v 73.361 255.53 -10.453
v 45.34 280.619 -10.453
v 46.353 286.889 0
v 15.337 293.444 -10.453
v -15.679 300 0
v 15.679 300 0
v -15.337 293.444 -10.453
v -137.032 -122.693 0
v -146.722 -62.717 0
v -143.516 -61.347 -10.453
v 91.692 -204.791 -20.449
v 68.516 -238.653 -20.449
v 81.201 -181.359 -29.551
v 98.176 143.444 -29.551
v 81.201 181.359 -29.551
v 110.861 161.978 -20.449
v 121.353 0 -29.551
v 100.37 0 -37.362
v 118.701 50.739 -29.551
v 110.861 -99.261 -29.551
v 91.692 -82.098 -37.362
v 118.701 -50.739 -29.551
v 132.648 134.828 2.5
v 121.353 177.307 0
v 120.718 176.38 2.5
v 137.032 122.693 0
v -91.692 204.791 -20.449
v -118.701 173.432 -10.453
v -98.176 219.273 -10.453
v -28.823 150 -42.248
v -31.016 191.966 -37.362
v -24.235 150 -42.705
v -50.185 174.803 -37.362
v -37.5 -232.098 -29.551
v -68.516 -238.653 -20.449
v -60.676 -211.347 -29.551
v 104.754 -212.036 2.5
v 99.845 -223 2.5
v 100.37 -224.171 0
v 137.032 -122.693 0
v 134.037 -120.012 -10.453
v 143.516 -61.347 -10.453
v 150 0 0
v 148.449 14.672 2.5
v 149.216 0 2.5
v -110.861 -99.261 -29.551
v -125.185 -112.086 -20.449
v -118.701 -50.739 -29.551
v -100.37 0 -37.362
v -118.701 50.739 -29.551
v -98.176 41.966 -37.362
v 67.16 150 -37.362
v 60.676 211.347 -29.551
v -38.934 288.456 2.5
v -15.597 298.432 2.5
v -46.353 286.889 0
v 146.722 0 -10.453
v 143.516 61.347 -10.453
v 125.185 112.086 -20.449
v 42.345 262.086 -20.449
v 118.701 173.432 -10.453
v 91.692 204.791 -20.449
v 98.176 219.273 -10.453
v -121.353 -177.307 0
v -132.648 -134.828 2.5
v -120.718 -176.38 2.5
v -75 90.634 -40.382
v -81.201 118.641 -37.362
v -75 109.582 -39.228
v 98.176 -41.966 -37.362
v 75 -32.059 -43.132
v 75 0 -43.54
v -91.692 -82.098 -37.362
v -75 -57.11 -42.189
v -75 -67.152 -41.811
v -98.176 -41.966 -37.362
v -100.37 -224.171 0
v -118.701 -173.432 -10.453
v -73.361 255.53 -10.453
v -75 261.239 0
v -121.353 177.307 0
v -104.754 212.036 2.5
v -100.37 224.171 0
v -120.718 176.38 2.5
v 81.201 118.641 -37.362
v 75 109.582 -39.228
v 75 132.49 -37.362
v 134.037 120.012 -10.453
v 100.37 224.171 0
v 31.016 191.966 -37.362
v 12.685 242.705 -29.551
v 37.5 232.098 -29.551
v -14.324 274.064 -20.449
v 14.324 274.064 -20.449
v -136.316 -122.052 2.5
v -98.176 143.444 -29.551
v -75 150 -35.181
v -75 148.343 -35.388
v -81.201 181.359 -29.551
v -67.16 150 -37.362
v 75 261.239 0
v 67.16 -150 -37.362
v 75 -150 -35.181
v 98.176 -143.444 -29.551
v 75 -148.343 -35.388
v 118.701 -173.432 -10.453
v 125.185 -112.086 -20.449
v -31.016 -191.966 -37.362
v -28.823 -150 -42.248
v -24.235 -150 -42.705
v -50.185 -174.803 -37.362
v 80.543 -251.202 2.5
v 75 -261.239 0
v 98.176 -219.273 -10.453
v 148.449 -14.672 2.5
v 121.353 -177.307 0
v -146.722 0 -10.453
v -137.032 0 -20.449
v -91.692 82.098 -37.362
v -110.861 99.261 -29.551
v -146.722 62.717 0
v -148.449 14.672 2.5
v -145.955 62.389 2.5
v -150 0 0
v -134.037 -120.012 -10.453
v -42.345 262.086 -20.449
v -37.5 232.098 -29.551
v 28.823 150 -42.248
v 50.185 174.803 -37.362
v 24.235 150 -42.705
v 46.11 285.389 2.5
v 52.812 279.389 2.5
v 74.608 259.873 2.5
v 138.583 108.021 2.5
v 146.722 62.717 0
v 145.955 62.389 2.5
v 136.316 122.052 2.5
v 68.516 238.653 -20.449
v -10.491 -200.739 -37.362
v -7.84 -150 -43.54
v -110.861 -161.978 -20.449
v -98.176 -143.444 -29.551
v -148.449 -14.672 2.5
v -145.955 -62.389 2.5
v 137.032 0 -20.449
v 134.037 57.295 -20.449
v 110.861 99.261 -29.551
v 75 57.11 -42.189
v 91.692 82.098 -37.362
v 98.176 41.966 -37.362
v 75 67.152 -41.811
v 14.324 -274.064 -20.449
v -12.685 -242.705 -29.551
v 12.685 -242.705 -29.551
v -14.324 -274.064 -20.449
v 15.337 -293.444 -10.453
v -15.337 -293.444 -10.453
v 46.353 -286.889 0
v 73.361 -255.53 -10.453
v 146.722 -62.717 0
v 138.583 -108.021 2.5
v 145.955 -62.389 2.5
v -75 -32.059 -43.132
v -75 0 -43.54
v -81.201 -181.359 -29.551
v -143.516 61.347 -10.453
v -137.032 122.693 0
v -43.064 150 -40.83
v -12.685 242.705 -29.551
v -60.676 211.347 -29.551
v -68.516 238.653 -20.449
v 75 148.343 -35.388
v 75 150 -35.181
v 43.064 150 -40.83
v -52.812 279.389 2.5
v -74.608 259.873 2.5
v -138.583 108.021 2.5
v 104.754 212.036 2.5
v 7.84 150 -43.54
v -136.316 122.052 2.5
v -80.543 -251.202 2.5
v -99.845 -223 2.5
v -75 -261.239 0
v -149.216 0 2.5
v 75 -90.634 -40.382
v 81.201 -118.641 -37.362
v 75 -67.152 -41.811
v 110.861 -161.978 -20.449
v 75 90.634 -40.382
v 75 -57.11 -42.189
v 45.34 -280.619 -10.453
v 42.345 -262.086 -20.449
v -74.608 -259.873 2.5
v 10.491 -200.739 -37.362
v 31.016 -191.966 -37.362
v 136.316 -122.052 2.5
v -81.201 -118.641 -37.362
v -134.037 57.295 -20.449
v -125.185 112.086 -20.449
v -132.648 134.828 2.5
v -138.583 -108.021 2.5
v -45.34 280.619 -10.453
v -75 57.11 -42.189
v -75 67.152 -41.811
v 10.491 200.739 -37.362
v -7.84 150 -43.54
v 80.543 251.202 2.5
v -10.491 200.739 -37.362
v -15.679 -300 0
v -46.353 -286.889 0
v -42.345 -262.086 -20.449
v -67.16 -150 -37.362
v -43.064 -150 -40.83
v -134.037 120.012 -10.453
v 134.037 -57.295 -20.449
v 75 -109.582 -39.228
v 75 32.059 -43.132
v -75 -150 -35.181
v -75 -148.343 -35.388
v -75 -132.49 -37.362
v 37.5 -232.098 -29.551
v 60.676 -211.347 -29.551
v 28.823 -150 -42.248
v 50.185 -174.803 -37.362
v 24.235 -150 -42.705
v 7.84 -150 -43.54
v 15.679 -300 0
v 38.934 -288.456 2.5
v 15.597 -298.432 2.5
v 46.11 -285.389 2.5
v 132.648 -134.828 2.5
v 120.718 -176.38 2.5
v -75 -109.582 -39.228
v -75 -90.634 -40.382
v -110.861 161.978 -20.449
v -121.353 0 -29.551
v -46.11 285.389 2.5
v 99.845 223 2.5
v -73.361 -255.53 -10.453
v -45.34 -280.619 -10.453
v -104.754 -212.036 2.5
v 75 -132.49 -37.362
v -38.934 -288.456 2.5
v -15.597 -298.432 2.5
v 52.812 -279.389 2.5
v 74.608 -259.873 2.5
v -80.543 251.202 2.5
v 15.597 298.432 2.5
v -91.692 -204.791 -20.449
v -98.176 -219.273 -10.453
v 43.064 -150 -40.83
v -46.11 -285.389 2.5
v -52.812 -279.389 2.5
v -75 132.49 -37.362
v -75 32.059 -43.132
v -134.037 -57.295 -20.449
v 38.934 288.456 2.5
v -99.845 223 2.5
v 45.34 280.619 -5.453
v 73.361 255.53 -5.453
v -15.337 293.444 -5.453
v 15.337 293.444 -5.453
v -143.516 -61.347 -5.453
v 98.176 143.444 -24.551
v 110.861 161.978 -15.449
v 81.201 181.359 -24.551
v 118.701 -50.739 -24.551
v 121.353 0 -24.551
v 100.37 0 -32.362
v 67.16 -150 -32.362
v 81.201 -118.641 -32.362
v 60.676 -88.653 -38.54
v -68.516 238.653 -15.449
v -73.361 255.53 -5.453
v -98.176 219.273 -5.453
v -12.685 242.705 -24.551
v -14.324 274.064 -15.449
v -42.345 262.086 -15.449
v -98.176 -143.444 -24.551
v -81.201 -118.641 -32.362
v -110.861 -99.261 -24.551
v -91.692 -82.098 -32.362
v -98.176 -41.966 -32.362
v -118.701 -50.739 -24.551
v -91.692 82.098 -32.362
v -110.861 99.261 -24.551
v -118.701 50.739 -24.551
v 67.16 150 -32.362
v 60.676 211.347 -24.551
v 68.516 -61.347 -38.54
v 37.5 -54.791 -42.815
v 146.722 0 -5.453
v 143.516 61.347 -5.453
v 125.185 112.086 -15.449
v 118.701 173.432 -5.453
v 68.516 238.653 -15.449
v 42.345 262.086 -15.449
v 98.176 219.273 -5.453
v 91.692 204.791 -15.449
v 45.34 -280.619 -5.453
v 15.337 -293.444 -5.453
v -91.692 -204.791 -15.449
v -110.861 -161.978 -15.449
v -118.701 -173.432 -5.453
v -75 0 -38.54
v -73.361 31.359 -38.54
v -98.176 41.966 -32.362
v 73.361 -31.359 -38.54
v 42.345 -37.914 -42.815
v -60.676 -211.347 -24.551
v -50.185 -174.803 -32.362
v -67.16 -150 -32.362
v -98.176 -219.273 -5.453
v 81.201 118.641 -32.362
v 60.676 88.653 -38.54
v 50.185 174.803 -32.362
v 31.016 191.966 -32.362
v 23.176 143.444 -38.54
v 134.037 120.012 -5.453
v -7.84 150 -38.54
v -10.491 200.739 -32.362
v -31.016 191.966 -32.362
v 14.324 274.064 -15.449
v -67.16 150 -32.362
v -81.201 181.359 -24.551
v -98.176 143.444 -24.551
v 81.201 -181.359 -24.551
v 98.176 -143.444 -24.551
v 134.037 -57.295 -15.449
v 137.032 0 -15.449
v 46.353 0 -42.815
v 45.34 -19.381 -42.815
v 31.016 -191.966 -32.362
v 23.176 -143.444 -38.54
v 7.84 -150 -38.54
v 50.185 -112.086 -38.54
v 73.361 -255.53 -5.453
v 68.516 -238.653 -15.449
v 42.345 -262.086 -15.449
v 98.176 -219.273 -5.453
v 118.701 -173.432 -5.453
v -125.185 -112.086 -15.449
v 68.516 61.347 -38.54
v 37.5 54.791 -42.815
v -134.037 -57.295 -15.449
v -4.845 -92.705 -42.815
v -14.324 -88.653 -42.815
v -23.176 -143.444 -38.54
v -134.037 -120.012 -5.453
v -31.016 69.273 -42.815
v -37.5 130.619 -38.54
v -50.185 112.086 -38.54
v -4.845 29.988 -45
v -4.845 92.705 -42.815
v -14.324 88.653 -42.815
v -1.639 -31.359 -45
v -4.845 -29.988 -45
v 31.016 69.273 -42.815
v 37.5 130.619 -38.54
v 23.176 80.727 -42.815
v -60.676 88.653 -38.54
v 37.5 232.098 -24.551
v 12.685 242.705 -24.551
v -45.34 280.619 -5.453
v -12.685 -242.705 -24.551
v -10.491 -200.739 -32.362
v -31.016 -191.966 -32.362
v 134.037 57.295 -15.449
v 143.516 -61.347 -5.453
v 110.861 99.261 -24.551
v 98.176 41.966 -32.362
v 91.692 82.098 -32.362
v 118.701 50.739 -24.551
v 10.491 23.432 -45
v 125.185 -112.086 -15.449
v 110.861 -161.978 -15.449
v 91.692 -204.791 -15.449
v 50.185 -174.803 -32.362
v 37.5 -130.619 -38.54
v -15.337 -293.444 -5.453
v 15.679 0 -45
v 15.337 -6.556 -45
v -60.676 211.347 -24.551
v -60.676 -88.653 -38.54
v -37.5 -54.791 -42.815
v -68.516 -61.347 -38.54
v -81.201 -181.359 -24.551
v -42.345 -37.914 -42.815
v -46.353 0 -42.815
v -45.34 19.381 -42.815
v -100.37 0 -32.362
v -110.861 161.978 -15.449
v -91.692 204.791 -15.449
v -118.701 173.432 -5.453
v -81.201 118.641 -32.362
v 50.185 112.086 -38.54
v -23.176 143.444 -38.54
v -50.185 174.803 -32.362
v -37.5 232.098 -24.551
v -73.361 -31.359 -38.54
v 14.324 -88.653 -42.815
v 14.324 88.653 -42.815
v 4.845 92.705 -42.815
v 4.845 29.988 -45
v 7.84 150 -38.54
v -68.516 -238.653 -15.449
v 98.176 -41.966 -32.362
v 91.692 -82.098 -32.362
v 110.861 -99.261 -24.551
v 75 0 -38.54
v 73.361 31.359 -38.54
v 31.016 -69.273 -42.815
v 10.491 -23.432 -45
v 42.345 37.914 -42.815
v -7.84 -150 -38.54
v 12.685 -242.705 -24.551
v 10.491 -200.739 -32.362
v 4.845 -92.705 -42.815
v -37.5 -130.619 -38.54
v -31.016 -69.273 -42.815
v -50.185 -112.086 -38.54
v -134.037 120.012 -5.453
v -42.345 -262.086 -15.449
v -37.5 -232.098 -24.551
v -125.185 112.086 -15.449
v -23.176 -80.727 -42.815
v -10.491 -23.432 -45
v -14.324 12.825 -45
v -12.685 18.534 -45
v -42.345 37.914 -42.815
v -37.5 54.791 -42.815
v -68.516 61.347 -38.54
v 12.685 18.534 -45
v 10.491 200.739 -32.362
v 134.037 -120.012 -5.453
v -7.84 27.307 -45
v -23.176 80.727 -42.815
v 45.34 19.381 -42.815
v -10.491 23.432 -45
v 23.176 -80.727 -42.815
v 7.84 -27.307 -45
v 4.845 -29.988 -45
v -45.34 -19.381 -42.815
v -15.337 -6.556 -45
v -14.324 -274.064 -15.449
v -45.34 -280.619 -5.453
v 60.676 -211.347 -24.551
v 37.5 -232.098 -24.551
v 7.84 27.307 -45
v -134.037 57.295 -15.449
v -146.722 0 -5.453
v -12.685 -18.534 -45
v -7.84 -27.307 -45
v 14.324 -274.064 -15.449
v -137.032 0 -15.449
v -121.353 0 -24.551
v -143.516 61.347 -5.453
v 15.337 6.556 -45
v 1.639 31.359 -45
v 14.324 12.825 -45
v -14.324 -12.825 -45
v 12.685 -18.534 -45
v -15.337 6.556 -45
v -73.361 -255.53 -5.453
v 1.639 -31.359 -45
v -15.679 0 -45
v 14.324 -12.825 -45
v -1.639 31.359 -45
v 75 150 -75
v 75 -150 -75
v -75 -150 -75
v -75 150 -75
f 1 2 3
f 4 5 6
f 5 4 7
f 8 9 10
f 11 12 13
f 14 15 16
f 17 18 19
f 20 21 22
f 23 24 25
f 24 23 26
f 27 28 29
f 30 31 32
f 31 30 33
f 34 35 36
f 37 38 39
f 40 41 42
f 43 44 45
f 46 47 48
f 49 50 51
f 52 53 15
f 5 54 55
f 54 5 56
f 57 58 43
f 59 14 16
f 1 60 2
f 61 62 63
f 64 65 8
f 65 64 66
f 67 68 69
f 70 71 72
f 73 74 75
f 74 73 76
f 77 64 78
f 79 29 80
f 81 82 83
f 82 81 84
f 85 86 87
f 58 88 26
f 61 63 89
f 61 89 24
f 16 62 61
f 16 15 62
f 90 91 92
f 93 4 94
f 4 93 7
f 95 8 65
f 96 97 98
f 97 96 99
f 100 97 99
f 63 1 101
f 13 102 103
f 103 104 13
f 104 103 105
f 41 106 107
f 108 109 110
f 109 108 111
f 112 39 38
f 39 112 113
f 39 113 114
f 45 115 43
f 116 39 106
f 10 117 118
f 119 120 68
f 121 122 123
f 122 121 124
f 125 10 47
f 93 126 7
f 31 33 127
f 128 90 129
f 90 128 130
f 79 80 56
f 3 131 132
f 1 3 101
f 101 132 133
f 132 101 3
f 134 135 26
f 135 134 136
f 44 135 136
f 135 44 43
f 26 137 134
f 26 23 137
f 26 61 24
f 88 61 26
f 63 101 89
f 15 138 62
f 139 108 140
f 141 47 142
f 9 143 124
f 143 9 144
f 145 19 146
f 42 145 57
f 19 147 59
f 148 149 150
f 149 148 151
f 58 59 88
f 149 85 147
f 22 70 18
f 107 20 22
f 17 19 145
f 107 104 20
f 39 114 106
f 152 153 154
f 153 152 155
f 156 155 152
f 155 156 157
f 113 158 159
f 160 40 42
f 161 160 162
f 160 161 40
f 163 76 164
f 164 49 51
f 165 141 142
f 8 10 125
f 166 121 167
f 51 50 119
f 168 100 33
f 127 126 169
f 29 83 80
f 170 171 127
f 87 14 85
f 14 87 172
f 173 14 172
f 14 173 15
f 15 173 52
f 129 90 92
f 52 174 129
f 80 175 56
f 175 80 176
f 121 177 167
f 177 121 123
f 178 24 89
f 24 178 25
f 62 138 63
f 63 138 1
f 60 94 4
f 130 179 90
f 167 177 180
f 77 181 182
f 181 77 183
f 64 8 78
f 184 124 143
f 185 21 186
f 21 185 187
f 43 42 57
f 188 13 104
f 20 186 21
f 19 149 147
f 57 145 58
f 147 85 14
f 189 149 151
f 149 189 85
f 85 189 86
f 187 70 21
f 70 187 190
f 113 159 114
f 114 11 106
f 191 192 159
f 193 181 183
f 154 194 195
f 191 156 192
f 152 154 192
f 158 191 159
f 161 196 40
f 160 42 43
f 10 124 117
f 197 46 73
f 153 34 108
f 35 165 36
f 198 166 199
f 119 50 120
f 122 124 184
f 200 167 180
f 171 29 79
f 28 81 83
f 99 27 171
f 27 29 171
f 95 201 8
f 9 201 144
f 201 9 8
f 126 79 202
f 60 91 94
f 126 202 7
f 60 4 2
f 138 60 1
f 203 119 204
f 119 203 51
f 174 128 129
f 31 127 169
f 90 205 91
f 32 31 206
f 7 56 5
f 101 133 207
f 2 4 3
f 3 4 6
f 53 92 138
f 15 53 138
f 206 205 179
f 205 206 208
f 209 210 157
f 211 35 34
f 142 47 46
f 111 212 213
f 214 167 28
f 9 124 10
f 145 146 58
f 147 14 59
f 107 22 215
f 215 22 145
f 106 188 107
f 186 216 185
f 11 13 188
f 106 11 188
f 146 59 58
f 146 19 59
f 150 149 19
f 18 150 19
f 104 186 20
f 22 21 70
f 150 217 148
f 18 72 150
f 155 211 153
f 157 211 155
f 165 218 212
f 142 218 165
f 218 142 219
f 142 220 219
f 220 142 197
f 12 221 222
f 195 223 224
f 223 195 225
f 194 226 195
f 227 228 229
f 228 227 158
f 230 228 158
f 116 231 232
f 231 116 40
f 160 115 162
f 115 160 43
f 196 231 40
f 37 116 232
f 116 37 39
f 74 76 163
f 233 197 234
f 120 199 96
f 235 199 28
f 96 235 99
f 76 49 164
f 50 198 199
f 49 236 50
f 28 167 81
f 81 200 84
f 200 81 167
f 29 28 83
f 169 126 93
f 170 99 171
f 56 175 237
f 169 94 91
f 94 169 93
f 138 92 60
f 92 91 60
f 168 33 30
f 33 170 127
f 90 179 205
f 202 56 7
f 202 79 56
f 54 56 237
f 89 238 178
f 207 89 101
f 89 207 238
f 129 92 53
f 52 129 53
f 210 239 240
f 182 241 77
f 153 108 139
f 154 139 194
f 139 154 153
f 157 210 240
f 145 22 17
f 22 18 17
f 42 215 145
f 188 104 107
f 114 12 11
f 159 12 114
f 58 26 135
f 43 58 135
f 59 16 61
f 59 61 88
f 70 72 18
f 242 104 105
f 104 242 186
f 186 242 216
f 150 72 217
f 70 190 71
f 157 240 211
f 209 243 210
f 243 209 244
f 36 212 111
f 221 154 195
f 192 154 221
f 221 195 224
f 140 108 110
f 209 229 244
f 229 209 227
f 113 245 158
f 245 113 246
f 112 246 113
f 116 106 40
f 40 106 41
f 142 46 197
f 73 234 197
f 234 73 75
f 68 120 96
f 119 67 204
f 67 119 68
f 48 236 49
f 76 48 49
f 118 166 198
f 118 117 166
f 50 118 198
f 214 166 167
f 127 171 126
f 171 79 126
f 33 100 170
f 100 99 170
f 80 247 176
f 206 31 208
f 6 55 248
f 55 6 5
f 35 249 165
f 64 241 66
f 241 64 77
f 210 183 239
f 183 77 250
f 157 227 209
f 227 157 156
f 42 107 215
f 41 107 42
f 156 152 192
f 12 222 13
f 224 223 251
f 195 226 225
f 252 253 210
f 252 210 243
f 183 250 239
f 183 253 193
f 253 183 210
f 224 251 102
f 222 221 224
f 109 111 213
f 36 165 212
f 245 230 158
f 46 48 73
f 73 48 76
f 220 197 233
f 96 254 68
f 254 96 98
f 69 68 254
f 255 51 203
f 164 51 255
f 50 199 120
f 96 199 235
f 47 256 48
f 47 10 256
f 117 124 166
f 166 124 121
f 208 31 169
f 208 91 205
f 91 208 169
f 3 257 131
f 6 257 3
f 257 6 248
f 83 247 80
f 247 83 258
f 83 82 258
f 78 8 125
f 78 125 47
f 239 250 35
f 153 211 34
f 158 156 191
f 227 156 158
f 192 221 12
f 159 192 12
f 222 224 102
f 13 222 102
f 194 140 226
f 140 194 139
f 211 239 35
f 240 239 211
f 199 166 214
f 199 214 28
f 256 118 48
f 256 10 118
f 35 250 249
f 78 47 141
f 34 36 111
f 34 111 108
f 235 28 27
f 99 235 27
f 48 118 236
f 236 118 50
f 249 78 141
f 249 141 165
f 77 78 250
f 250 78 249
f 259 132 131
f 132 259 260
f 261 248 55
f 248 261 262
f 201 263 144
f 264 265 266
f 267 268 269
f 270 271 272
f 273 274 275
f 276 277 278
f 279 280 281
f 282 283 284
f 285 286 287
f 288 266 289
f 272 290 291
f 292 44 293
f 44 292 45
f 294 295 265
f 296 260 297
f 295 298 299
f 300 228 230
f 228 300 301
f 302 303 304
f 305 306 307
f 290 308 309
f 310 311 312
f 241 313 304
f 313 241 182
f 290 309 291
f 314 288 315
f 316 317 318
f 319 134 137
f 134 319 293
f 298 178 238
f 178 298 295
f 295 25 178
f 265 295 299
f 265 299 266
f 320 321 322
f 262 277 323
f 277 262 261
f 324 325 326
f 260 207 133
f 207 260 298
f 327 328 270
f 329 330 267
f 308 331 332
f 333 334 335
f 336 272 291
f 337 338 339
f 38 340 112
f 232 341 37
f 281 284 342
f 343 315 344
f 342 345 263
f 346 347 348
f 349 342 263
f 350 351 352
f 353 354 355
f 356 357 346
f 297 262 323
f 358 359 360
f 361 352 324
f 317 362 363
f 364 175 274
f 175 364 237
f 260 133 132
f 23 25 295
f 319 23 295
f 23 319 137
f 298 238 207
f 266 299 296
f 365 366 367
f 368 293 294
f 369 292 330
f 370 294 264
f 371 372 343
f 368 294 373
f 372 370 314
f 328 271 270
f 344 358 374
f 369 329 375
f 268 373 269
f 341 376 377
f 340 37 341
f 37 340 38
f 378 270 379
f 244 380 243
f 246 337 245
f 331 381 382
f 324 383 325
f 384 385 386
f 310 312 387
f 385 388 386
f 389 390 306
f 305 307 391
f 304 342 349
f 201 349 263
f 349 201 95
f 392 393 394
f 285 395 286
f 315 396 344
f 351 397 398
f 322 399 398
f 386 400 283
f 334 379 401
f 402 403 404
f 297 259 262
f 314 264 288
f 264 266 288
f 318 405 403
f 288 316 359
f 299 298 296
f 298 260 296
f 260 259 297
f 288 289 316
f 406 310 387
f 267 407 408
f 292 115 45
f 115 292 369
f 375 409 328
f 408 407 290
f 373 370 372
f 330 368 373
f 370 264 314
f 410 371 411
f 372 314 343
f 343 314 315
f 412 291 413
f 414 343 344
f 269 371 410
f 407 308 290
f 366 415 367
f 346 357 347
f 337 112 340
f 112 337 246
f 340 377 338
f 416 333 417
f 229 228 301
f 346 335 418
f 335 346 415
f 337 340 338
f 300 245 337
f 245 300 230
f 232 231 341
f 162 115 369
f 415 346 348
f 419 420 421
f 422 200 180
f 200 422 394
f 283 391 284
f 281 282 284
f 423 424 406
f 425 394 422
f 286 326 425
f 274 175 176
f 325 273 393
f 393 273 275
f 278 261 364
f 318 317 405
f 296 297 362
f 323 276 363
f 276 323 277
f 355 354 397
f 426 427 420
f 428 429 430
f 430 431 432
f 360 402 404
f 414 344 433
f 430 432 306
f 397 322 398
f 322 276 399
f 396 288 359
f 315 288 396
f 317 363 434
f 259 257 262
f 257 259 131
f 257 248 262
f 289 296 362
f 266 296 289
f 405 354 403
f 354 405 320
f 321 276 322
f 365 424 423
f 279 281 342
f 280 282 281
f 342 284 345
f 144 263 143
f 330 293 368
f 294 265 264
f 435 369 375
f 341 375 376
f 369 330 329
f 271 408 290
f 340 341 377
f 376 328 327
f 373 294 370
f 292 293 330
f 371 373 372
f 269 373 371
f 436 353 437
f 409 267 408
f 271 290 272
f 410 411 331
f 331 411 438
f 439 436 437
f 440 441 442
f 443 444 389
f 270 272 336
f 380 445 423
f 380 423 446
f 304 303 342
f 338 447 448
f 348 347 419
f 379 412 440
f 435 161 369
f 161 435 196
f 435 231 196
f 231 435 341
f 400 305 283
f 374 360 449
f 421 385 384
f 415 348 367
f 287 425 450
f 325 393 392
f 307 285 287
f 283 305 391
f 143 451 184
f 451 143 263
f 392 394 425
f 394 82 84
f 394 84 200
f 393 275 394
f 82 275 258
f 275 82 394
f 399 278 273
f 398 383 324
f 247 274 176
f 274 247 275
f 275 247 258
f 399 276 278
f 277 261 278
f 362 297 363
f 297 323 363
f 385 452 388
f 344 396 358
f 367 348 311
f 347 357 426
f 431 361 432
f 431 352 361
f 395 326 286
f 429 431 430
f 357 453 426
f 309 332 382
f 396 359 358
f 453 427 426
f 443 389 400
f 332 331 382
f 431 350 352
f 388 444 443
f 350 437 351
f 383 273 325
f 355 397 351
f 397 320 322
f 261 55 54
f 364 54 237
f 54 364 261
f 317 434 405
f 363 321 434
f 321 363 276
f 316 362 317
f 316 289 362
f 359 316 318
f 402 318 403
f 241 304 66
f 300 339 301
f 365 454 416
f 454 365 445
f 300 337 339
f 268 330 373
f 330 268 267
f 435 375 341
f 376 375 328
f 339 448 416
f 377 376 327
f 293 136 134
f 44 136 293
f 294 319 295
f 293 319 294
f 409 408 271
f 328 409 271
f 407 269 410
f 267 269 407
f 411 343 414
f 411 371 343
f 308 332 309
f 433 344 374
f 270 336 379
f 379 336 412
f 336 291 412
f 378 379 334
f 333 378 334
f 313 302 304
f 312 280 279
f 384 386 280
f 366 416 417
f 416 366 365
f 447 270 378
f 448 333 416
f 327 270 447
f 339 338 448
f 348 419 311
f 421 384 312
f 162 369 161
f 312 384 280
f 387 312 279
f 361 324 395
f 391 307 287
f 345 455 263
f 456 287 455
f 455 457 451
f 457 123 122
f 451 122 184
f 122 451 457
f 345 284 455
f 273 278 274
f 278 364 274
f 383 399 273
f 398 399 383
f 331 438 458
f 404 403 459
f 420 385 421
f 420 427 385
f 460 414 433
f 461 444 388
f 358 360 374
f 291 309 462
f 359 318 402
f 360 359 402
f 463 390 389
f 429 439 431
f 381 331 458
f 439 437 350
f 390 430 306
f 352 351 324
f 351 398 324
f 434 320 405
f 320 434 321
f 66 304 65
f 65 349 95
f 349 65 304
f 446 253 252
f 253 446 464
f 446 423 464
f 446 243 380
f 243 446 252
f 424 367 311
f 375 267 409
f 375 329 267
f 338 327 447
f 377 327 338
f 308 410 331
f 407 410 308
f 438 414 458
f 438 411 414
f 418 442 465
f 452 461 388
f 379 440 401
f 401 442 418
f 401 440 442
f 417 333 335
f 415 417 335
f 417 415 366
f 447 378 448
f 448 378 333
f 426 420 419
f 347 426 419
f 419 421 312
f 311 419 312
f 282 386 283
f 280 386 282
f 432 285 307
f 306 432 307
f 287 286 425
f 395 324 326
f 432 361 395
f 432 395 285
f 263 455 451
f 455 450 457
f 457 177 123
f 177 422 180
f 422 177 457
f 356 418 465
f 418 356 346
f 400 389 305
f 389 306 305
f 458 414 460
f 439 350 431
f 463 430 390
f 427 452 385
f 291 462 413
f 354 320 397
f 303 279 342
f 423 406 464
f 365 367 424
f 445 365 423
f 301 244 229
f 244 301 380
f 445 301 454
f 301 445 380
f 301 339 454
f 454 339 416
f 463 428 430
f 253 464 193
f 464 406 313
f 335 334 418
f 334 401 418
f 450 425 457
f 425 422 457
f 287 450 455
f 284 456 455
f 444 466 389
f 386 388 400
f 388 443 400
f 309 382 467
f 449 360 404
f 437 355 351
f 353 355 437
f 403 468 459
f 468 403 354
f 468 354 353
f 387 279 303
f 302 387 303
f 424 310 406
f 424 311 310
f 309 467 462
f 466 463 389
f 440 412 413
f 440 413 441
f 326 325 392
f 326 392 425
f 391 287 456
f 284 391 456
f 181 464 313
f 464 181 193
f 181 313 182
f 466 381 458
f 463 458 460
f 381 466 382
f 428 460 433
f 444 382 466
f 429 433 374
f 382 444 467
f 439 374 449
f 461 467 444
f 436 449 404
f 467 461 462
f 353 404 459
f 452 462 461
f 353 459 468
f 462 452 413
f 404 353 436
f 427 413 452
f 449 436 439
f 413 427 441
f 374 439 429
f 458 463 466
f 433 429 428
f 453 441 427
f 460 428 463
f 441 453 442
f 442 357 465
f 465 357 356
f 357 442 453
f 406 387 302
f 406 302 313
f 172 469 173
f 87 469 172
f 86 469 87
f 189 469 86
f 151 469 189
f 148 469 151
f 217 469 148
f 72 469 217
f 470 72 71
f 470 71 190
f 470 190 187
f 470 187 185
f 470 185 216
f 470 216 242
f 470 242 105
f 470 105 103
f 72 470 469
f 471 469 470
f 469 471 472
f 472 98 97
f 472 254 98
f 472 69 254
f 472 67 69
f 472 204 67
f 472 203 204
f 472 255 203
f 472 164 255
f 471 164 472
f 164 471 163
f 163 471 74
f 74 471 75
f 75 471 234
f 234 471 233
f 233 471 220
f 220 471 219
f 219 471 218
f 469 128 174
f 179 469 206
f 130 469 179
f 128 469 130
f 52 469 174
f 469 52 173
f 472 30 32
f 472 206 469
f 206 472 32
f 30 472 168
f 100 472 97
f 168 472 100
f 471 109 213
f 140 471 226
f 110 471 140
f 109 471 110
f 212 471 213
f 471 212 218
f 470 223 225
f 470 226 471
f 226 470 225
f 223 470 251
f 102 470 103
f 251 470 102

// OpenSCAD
// [FL_INDEX: keywords="openscad, 3d_parametric, Customizable_Bowl, csg_solid" | COT="Parametric OpenSCAD design from 3DCodeverse"]
// Title: Customizable Bowl

// Bowl Width
bowlWidth = 300; // [50:500]
// Bowl Height
bowlHeight= 600; // [50:500]
// Bowl Thickness
bowlThickness = 100; // [50:500]

footWidth = bowlWidth/2;
footHeight = bowlHeight/2;
footThickness = bowlThickness/2;

//module createBowl() {
	difference() {
		resize(newsize=[bowlWidth, bowlHeight, bowlThickness]) sphere(r=10);
		translate([0,0,5]) resize(newsize=[bowlWidth, bowlHeight, bowlThickness]) sphere(r=10); 
	}
//}	

//module createFoot() {
	difference() {
		translate([-footWidth/2, -footHeight/2, -3/2*footThickness]) cube([footWidth, footHeight, footThickness]);
		resize(newsize=[bowlWidth, bowlHeight, bowlThickness]) sphere(r=10);
	}
//}


//createBowl();
//createFoot();
